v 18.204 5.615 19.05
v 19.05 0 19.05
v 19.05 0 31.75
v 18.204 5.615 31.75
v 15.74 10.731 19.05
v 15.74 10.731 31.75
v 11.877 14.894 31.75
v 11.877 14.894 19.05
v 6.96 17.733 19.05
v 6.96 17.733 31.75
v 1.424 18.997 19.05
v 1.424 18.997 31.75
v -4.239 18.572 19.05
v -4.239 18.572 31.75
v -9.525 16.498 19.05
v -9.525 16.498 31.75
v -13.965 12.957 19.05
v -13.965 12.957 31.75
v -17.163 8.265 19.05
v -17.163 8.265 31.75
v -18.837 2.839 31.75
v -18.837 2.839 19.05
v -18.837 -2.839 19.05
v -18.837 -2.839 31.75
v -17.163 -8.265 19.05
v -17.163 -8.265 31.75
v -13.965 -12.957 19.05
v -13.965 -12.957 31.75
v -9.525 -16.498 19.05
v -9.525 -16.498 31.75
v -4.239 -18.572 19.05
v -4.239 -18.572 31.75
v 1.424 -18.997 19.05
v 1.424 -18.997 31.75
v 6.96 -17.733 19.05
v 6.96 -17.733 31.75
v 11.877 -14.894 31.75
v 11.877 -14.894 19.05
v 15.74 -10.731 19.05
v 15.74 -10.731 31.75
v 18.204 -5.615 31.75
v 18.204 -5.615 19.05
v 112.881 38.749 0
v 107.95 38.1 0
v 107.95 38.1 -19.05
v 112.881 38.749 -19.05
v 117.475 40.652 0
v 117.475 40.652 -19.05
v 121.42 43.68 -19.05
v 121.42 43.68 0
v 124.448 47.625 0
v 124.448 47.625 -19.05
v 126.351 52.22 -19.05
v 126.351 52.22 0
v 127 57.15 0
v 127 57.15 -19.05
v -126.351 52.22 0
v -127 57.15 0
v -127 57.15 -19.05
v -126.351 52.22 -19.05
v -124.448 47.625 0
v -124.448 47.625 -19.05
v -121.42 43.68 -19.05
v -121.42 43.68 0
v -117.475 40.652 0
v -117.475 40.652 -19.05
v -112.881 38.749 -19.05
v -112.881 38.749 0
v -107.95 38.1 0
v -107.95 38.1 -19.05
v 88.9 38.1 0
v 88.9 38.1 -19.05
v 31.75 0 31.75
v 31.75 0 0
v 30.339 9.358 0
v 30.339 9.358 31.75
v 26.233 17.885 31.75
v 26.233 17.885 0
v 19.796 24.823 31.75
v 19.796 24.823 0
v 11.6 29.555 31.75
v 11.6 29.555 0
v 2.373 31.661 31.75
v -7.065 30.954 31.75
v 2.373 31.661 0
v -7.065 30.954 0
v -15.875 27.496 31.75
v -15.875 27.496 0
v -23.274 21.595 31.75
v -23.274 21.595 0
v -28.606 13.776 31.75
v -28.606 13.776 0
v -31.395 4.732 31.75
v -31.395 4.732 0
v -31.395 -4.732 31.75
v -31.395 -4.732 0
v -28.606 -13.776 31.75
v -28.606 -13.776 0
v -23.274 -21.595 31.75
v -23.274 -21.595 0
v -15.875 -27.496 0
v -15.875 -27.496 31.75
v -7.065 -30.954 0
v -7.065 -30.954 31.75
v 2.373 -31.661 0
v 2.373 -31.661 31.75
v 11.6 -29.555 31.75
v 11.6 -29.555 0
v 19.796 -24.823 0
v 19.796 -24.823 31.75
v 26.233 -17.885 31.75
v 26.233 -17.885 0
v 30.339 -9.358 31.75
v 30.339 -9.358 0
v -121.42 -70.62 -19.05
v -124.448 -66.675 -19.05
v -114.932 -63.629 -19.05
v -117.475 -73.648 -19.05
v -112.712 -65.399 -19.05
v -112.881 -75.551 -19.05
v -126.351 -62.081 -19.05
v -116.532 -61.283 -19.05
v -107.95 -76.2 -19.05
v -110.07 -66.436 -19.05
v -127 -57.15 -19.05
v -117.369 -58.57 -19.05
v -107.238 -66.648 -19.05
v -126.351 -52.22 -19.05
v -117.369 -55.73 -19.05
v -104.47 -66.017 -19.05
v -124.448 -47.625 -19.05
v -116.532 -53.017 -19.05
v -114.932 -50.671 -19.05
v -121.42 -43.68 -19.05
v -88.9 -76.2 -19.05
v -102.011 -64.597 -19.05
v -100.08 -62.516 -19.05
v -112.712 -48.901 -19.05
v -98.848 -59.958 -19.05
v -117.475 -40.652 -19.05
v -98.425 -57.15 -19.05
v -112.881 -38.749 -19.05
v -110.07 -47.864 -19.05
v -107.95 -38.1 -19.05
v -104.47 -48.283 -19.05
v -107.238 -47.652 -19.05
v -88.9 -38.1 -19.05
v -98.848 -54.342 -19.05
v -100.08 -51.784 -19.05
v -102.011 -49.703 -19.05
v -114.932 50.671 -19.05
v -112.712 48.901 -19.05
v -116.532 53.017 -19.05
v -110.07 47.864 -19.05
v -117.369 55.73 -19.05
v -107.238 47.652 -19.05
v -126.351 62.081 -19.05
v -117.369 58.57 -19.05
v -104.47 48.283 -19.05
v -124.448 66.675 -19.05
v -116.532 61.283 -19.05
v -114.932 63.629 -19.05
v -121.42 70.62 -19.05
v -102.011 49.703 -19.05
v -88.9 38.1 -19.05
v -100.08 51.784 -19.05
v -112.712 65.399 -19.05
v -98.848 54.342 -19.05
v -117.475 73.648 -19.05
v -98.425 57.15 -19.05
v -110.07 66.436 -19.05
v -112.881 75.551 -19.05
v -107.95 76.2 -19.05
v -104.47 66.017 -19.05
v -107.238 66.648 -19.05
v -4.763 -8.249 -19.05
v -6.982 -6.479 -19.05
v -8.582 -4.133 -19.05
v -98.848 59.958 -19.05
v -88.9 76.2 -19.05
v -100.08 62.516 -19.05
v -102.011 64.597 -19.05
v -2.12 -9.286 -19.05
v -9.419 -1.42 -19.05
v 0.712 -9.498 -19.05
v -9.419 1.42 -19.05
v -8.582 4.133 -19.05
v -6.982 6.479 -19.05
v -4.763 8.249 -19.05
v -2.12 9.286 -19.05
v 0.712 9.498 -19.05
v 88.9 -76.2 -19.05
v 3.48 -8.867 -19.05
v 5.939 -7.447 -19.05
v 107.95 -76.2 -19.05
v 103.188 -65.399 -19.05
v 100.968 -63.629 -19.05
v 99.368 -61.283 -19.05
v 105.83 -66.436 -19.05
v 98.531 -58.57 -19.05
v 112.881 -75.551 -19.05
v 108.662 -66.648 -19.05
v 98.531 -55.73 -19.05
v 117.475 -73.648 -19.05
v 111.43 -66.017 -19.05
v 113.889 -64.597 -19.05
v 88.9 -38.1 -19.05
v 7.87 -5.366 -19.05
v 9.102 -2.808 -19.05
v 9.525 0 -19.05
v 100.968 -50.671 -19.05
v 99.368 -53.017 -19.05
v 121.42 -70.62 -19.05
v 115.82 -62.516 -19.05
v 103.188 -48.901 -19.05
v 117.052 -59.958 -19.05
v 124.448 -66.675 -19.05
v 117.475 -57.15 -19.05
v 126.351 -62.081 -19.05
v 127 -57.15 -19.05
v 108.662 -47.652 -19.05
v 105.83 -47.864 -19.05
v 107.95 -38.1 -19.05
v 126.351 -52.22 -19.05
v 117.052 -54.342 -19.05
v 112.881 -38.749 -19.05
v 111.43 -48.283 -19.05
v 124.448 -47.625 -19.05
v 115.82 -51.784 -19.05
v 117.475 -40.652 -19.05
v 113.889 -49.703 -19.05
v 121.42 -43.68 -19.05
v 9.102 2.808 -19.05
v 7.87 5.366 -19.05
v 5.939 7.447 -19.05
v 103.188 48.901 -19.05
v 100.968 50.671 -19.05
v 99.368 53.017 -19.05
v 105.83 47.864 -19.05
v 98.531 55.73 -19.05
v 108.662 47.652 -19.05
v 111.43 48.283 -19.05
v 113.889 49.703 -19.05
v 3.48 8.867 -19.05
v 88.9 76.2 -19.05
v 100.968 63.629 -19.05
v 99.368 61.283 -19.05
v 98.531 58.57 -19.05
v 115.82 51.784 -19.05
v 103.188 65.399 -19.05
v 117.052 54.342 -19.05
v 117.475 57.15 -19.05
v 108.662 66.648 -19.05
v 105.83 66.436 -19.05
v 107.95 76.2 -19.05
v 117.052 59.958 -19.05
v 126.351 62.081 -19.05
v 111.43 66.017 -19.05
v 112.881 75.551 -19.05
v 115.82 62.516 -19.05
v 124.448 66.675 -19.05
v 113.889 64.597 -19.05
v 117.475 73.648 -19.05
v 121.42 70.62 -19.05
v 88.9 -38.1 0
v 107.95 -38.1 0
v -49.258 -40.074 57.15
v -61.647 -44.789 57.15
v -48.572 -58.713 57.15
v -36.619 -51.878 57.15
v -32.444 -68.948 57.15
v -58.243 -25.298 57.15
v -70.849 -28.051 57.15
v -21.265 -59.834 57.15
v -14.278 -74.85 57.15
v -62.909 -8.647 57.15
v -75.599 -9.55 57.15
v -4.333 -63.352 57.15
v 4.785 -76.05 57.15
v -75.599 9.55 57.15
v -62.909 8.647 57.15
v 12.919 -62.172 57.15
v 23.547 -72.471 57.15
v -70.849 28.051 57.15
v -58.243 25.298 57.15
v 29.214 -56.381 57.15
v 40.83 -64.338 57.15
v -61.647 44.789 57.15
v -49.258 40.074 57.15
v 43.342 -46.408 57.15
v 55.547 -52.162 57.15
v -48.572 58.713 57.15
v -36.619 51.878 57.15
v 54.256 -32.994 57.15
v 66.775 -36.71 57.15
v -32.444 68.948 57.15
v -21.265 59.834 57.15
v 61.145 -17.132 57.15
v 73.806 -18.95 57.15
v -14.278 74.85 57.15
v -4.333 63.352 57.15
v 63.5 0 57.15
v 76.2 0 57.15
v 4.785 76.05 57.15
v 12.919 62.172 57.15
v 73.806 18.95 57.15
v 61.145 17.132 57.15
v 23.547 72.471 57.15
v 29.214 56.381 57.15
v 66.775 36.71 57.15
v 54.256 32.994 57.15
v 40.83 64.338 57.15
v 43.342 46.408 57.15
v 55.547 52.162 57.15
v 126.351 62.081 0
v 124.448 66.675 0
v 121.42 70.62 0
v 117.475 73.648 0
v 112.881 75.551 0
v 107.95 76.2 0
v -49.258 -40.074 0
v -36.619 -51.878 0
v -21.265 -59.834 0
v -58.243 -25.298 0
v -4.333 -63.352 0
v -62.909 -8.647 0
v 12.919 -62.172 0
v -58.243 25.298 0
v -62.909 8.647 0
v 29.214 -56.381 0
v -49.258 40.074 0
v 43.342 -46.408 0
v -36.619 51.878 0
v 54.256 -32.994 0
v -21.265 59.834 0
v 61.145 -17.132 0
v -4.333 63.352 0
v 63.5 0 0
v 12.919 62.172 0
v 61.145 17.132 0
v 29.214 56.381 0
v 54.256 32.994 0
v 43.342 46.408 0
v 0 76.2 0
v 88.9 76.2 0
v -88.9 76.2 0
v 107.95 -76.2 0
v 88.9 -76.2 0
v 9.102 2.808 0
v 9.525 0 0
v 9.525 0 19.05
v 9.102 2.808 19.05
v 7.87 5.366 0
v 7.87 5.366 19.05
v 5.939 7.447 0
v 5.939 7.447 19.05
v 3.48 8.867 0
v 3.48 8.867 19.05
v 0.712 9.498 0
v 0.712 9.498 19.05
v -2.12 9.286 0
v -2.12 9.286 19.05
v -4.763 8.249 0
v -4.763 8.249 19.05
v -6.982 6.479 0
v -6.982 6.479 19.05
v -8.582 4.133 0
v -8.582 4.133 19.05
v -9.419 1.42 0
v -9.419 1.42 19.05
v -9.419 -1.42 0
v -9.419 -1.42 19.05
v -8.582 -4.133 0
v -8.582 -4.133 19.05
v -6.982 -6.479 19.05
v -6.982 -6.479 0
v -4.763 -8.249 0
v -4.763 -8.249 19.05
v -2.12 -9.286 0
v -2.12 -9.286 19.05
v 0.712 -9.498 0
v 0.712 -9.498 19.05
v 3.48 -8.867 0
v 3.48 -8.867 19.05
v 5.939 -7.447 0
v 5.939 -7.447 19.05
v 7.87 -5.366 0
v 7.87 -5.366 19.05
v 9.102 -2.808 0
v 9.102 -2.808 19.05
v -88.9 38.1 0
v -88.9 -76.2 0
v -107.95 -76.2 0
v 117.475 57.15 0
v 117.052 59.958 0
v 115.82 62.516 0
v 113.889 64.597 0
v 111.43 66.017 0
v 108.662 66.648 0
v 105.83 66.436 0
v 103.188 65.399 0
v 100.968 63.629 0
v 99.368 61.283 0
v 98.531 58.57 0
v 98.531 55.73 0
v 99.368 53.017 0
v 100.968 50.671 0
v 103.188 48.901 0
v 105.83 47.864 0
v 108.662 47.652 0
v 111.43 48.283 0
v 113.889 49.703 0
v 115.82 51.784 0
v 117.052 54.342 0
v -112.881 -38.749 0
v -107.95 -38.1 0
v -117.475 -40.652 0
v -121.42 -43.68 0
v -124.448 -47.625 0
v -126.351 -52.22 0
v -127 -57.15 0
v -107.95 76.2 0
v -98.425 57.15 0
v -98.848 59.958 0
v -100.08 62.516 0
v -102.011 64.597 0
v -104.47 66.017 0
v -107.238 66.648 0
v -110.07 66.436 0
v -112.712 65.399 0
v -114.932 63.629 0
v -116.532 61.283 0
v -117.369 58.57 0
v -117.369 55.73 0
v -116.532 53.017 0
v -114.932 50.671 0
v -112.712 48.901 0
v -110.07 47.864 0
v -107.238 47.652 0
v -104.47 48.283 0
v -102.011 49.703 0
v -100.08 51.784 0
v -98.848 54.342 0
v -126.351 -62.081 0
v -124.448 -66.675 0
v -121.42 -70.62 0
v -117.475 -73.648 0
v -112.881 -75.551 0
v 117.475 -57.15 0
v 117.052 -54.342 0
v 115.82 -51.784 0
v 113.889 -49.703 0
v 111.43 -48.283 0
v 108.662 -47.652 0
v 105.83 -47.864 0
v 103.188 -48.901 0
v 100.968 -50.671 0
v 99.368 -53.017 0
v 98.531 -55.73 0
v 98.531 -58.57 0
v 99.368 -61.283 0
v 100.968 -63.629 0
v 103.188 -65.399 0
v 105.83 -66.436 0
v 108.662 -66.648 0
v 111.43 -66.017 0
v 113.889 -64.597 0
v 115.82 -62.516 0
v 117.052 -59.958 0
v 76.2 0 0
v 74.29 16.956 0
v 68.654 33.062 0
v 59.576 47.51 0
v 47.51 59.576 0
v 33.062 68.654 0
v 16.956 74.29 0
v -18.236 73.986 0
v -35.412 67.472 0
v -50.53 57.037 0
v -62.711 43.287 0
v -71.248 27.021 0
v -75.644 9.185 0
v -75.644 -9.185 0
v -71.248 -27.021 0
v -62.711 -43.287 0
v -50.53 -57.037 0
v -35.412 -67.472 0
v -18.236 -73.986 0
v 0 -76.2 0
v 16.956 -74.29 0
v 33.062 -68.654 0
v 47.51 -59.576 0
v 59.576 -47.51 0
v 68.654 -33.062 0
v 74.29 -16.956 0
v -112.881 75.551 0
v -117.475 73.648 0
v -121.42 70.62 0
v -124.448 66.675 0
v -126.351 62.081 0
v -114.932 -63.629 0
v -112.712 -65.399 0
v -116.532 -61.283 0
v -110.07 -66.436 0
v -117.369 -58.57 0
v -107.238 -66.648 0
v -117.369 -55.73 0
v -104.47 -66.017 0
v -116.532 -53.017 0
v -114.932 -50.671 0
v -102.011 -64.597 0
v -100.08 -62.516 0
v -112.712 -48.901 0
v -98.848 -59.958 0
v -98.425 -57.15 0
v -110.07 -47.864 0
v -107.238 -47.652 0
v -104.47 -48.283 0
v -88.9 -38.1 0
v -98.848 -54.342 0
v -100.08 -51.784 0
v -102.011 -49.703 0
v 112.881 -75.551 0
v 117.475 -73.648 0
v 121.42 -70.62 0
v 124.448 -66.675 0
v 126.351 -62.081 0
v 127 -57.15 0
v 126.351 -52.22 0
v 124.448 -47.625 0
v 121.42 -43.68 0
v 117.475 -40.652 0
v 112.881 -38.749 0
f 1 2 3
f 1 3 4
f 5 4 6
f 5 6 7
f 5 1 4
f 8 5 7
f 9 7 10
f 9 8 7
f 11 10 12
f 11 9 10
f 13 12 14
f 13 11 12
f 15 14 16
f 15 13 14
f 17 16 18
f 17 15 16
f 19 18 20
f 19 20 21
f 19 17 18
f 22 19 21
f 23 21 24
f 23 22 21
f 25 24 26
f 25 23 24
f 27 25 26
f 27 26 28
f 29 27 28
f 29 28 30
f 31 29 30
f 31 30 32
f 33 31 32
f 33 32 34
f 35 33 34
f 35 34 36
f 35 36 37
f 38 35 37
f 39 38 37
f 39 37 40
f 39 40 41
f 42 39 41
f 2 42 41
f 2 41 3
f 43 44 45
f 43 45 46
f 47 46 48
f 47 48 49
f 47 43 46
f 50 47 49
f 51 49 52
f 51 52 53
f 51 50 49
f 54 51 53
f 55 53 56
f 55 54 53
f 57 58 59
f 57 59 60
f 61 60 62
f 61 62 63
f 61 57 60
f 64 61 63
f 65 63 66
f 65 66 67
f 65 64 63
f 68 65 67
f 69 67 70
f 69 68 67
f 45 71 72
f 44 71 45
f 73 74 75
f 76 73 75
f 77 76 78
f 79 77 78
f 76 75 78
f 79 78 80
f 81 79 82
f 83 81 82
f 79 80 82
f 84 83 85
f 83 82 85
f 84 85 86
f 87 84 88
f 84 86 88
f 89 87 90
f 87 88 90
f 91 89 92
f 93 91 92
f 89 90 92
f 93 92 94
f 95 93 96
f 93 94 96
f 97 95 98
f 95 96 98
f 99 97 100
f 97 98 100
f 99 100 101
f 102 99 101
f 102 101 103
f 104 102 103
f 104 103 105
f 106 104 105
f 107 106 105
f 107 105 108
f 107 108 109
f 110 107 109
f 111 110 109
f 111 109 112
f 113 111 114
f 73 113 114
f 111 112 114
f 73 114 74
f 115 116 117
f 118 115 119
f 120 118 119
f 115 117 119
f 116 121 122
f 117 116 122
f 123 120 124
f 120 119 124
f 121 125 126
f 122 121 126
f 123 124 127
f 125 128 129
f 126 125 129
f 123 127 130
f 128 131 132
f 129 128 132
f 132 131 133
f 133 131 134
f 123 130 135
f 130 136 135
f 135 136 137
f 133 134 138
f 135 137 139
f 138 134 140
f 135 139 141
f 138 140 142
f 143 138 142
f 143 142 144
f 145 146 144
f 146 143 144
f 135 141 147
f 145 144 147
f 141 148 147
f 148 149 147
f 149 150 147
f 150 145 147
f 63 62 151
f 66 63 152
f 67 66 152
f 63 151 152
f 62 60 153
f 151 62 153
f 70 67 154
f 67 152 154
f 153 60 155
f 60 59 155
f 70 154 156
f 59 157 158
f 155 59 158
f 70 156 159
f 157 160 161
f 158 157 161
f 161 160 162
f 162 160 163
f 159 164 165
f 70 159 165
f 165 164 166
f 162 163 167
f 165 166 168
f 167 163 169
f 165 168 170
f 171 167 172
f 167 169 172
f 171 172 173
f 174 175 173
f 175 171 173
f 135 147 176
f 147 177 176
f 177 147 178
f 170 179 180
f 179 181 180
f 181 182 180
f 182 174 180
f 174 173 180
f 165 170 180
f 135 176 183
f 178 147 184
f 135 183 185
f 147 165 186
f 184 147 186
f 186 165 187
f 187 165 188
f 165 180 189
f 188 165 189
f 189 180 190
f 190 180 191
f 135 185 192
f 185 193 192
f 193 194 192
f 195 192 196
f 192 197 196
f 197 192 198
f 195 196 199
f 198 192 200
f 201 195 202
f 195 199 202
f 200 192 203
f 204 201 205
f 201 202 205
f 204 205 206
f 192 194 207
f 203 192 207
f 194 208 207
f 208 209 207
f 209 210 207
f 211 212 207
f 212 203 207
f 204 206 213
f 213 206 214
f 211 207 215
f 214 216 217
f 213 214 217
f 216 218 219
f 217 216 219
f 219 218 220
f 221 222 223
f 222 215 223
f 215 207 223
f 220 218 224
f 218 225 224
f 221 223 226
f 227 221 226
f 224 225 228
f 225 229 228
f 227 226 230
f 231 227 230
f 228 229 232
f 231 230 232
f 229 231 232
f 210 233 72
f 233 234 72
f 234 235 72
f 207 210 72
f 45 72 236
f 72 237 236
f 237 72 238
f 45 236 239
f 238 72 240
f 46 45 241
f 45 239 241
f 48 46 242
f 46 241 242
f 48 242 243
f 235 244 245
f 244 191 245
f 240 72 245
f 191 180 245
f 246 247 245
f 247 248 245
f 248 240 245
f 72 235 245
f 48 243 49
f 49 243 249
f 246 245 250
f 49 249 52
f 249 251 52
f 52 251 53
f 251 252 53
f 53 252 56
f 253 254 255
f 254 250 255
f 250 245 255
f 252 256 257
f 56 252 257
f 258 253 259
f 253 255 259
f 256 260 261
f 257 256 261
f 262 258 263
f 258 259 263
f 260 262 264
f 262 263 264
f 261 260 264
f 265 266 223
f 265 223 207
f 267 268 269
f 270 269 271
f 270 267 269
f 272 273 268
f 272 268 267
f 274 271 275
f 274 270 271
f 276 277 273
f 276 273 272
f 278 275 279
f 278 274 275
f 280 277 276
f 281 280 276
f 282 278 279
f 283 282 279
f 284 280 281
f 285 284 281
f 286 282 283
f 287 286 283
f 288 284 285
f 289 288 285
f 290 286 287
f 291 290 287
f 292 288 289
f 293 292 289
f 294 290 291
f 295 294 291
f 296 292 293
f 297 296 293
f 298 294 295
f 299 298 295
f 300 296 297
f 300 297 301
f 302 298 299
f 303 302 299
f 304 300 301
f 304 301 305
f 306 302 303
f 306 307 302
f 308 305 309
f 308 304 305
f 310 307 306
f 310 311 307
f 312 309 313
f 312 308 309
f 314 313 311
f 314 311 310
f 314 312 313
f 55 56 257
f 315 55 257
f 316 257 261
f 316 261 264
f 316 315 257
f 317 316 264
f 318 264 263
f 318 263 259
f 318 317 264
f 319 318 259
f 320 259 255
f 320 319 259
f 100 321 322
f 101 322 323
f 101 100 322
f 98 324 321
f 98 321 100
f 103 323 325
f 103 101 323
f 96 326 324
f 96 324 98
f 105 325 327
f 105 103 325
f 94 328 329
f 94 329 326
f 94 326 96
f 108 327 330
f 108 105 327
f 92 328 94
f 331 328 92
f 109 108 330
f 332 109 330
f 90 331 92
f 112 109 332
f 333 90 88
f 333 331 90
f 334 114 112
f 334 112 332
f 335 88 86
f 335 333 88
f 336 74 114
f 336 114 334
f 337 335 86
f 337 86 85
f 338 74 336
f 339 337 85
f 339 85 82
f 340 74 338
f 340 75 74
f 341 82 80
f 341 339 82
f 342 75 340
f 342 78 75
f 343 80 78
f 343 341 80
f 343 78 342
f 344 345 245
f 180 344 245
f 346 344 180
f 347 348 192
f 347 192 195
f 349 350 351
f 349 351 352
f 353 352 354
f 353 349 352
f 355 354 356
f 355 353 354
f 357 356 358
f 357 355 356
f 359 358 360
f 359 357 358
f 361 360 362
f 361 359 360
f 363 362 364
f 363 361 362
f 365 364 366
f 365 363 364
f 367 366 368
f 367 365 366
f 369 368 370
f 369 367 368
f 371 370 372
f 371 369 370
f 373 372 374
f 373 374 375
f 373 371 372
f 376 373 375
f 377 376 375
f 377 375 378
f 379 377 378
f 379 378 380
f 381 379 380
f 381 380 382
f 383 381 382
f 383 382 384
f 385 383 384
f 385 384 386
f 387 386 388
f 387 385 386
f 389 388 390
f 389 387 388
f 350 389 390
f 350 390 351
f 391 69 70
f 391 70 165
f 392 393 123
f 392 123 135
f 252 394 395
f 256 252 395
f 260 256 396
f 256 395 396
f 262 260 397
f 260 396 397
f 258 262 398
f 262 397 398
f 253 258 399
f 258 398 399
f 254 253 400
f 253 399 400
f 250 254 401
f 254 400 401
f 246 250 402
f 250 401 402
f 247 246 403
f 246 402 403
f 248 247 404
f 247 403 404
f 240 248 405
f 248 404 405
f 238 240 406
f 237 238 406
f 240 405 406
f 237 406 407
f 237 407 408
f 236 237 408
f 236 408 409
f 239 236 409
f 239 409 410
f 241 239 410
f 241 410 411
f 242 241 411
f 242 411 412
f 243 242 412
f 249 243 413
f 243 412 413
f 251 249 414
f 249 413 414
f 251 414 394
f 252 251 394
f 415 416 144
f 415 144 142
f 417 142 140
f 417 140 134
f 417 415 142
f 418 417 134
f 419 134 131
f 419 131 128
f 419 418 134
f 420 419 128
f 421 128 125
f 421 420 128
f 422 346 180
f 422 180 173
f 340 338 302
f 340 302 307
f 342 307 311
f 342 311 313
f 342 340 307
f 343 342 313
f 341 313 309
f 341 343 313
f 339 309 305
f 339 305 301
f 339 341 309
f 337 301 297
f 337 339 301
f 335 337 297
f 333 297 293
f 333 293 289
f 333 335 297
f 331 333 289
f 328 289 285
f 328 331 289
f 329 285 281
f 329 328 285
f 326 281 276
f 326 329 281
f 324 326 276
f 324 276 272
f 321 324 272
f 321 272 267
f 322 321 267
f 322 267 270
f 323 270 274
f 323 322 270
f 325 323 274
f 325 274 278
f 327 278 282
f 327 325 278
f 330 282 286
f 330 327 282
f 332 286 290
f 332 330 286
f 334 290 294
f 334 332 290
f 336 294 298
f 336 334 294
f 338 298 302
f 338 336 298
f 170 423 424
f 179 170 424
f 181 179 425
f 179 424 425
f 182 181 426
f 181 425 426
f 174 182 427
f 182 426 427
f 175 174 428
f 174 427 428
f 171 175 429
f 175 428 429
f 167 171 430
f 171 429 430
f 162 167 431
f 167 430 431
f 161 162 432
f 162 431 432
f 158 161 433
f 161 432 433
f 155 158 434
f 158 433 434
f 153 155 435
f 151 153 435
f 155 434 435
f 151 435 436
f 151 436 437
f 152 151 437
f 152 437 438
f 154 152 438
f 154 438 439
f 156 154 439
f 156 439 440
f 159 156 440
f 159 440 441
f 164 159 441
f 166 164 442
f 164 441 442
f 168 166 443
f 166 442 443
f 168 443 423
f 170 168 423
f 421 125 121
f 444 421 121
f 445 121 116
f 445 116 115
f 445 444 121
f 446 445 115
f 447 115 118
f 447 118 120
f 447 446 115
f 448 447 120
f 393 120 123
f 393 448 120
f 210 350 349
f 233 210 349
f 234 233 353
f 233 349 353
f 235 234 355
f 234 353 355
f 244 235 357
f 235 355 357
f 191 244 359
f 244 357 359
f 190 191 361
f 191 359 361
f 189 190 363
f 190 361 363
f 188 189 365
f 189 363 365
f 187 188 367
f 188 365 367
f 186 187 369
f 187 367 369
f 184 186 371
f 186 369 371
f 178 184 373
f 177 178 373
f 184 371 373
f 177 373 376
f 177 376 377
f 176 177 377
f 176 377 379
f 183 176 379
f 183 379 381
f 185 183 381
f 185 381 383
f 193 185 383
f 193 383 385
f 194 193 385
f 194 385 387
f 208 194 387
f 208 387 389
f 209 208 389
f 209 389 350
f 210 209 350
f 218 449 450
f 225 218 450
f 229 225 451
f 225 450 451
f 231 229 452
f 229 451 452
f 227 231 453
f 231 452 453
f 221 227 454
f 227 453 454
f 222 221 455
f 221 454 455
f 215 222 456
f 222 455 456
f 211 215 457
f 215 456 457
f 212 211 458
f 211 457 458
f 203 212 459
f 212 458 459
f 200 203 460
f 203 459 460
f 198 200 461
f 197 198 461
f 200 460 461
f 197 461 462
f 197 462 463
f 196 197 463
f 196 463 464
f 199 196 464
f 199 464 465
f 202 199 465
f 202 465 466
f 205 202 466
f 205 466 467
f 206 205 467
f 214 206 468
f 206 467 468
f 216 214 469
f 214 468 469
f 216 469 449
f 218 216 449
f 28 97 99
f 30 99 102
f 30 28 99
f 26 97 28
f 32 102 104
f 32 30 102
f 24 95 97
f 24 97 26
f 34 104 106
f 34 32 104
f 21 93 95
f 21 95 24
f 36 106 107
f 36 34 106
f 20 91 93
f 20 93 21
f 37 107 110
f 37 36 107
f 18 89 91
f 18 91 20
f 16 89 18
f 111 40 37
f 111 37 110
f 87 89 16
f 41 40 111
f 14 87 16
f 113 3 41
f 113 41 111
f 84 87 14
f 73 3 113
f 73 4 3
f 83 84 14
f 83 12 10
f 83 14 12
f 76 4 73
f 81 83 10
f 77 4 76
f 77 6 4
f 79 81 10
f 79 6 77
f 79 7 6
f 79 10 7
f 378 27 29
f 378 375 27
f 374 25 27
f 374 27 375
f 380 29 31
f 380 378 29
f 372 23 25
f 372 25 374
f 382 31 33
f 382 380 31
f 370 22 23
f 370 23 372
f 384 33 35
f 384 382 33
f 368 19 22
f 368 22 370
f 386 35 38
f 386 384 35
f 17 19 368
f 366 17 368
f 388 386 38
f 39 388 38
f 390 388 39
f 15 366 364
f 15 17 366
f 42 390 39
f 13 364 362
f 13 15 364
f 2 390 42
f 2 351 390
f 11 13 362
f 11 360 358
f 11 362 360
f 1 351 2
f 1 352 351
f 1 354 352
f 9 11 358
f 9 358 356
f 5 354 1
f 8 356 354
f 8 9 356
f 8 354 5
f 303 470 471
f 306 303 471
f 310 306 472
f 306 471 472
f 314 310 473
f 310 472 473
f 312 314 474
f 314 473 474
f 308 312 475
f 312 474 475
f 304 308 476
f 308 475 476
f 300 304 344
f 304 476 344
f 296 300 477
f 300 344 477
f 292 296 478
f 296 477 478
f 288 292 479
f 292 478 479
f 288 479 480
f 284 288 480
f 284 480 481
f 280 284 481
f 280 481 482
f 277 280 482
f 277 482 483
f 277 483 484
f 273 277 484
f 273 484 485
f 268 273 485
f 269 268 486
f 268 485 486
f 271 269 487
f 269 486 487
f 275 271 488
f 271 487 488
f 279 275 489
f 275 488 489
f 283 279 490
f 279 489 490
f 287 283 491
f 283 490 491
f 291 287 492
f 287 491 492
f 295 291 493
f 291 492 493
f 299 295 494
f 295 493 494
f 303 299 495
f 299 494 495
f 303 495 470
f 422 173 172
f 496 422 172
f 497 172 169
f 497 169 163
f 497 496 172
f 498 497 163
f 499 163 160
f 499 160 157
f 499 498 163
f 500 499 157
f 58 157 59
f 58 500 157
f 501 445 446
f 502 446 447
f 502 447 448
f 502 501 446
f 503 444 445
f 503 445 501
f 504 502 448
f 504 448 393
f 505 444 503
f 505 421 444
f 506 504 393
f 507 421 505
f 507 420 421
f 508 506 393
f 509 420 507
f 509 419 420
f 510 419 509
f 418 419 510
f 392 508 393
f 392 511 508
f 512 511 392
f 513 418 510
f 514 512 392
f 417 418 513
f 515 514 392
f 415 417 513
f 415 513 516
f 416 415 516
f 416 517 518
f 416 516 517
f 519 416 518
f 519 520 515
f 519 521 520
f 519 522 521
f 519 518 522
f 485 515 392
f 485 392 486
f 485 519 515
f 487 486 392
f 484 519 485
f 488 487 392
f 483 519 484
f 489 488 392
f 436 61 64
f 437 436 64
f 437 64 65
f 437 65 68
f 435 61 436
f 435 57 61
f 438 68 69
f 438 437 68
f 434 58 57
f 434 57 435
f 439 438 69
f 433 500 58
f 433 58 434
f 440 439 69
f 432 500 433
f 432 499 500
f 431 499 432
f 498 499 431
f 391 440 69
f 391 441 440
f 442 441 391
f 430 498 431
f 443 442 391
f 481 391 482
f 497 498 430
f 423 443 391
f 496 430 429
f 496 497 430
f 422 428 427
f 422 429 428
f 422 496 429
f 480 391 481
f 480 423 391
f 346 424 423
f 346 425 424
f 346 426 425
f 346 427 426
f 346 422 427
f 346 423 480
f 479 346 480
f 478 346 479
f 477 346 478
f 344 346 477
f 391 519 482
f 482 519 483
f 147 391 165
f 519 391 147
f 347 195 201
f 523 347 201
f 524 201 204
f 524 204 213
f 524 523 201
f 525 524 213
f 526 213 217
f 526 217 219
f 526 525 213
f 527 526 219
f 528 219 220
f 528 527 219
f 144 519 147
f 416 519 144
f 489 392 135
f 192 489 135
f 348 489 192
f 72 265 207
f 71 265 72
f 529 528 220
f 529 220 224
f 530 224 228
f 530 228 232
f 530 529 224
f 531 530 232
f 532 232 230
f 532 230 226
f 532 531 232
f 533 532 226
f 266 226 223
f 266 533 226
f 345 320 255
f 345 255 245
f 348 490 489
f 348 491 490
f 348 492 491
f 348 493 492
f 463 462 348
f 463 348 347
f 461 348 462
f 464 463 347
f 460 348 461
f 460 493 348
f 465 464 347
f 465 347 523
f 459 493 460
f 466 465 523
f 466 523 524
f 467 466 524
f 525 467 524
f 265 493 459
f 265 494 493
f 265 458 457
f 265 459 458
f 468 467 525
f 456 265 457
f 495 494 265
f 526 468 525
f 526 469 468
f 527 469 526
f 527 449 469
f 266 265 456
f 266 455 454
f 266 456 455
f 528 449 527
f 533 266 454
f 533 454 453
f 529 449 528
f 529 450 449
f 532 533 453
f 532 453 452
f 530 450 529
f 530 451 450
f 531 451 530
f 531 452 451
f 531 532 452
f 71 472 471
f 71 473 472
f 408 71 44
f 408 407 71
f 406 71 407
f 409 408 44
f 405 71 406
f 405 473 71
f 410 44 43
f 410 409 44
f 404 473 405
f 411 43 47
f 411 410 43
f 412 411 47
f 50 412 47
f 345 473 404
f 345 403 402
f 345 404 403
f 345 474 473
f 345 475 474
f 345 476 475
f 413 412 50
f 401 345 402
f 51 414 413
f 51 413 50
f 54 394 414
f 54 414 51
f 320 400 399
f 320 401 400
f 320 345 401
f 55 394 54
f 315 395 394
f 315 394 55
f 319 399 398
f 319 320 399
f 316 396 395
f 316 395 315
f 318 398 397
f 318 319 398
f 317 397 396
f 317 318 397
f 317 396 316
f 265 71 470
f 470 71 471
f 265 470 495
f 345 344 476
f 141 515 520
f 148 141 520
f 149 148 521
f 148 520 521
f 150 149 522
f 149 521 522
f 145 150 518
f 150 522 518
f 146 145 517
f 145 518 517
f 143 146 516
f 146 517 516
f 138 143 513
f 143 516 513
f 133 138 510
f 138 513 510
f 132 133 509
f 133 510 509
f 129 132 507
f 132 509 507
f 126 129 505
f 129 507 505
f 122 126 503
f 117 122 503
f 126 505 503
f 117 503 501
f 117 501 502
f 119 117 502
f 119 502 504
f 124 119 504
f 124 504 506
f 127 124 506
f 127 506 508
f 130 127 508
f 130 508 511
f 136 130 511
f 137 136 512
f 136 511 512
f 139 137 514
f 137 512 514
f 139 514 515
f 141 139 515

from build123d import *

# Parameters (mm, degrees)
F0_R     = 63.5
F0_R_2   = 9.525
F0_R_3   = 31.75
F0_R_4   = 19.05
F1_DEPTH = 19.05
F2_DEPTH = 57.15
F3_DEPTH = 31.75
F4_DEPTH = 19.05
F5_DEPTH = 25.4


# Not quite as in the source:
# - ends of sketch curves that miss each other by under 0.0002 mm in the source are joined


with BuildPart() as f1:
    # F0 (on Top) → F1 (new body)
    with BuildSketch(Plane.XY):
        with BuildLine():
            ThreePointArc((2.2517e-06, -76.2), (53.8815375225, -53.8815359303), (76.2, 0))
            ThreePointArc((76.2, 0), (53.8815360903, 53.8815373625), (-1.7992e-06, 76.2))
            ThreePointArc((-1.7992e-06, 76.2), (-76.2, -2.0255e-06), (2.2517e-06, -76.2))
        make_face()
        Circle(F0_R, mode=Mode.SUBTRACT)
        with BuildLine():
            ThreePointArc((-1.7992e-06, 76.2), (53.8815360903, 53.8815373625), (76.2, 0))
            ThreePointArc((76.2, 0), (53.8815375225, -53.8815359303), (2.2517e-06, -76.2))
            Line((2.2517e-06, -76.2), (88.9, -76.199992084))
            Line((88.9, -76.199992084), (88.9, -38.100007916))
            Line((88.9, -38.100007916), (88.9, 38.100007916))
            Line((88.9, 38.100007916), (88.9, 76.200007916))
            Line((88.9, 76.200007916), (-1.7992e-06, 76.2))
        make_face()
        with BuildLine():
            ThreePointArc((2.2517e-06, -76.2), (-76.2, -2.0255e-06), (-1.7992e-06, 76.2))
            Line((-1.7992e-06, 76.2), (-88.9, 76.199992084))
            Line((-88.9, 76.199992084), (-88.9, 38.100007916))
            Line((-88.9, 38.100007916), (-88.9, -38.100007916))
            Line((-88.9, -38.100007916), (-88.9, -76.200007916))
            Line((-88.9, -76.200007916), (2.2517e-06, -76.2))
        make_face()
        with BuildLine():
            Line((-88.9, 38.100007916), (-88.9, 76.199992084))
            Line((-88.9, 76.199992084), (-107.95, 76.200007916))
            ThreePointArc((-107.95, 76.200007916), (-121.4203841816, 70.6203920976), (-127, 57.150007916))
            ThreePointArc((-127, 57.150007916), (-121.4203841816, 43.6796237344), (-107.95, 38.100007916))
            Line((-107.95, 38.100007916), (-88.9, 38.100007916))
        make_face()
        with Locations((-107.95, 57.150007916)):
            Circle(F0_R_2, mode=Mode.SUBTRACT)
        with BuildLine():
            Line((107.95, 76.200007916), (88.9, 76.200007916))
            Line((88.9, 76.200007916), (88.9, 38.100007916))
            Line((88.9, 38.100007916), (107.95, 38.100007916))
            ThreePointArc((107.95, 38.100007916), (121.4203841816, 43.6796237344), (127, 57.150007916))
            ThreePointArc((127, 57.150007916), (121.4203841816, 70.6203920976), (107.95, 76.200007916))
        make_face()
        with Locations((107.95, 57.150007916)):
            Circle(F0_R_2, mode=Mode.SUBTRACT)
        with BuildLine():
            Line((88.9, -38.100007916), (88.9, -76.199992084))
            Line((88.9, -76.199992084), (107.95, -76.200007916))
            ThreePointArc((107.95, -76.200007916), (121.4203841816, -70.6203920976), (127, -57.150007916))
            ThreePointArc((127, -57.150007916), (121.4203841816, -43.6796237344), (107.95, -38.100007916))
            Line((107.95, -38.100007916), (88.9, -38.100007916))
        make_face()
        with Locations((107.95, -57.150007916)):
            Circle(F0_R_2, mode=Mode.SUBTRACT)
        with BuildLine():
            Line((-107.95, -76.200007916), (-88.9, -76.200007916))
            Line((-88.9, -76.200007916), (-88.9, -38.100007916))
            Line((-88.9, -38.100007916), (-107.95, -38.100007916))
            ThreePointArc((-107.95, -38.100007916), (-121.4203841816, -43.6796237344), (-127, -57.150007916))
            ThreePointArc((-127, -57.150007916), (-121.4203841816, -70.6203920976), (-107.95, -76.200007916))
        make_face()
        with Locations((-107.95, -57.150007916)):
            Circle(F0_R_2, mode=Mode.SUBTRACT)
        Circle(F0_R)
        Circle(F0_R_3, mode=Mode.SUBTRACT)
        Circle(F0_R_3)
        Circle(F0_R_4, mode=Mode.SUBTRACT)
        Circle(F0_R_4)
        Circle(F0_R_2, mode=Mode.SUBTRACT)
        Circle(F0_R_2)
    extrude(amount=-F1_DEPTH)

    # F0 (on Top) → F2 (join)
    with BuildSketch(Plane.XY):
        with BuildLine():
            ThreePointArc((2.2517e-06, -76.2), (53.8815375225, -53.8815359303), (76.2, 0))
            ThreePointArc((76.2, 0), (53.8815360903, 53.8815373625), (-1.7992e-06, 76.2))
            ThreePointArc((-1.7992e-06, 76.2), (-76.2, -2.0255e-06), (2.2517e-06, -76.2))
        make_face()
        Circle(F0_R, mode=Mode.SUBTRACT)
    extrude(amount=F2_DEPTH)

    # F0 (on Top) → F3 (join)
    with BuildSketch(Plane.XY):
        Circle(F0_R_3)
        Circle(F0_R_4, mode=Mode.SUBTRACT)
    extrude(amount=F3_DEPTH)

    # F0 (on Top) → F4 (join)
    with BuildSketch(Plane.XY):
        Circle(F0_R_4)
        Circle(F0_R_2, mode=Mode.SUBTRACT)
    extrude(amount=F4_DEPTH)

    # F0 (on Top) → F5 (cut)
    with BuildSketch(Plane.XY):
        Circle(F0_R_2)
    extrude(amount=-F5_DEPTH, mode=Mode.SUBTRACT)


solid = f1.part
